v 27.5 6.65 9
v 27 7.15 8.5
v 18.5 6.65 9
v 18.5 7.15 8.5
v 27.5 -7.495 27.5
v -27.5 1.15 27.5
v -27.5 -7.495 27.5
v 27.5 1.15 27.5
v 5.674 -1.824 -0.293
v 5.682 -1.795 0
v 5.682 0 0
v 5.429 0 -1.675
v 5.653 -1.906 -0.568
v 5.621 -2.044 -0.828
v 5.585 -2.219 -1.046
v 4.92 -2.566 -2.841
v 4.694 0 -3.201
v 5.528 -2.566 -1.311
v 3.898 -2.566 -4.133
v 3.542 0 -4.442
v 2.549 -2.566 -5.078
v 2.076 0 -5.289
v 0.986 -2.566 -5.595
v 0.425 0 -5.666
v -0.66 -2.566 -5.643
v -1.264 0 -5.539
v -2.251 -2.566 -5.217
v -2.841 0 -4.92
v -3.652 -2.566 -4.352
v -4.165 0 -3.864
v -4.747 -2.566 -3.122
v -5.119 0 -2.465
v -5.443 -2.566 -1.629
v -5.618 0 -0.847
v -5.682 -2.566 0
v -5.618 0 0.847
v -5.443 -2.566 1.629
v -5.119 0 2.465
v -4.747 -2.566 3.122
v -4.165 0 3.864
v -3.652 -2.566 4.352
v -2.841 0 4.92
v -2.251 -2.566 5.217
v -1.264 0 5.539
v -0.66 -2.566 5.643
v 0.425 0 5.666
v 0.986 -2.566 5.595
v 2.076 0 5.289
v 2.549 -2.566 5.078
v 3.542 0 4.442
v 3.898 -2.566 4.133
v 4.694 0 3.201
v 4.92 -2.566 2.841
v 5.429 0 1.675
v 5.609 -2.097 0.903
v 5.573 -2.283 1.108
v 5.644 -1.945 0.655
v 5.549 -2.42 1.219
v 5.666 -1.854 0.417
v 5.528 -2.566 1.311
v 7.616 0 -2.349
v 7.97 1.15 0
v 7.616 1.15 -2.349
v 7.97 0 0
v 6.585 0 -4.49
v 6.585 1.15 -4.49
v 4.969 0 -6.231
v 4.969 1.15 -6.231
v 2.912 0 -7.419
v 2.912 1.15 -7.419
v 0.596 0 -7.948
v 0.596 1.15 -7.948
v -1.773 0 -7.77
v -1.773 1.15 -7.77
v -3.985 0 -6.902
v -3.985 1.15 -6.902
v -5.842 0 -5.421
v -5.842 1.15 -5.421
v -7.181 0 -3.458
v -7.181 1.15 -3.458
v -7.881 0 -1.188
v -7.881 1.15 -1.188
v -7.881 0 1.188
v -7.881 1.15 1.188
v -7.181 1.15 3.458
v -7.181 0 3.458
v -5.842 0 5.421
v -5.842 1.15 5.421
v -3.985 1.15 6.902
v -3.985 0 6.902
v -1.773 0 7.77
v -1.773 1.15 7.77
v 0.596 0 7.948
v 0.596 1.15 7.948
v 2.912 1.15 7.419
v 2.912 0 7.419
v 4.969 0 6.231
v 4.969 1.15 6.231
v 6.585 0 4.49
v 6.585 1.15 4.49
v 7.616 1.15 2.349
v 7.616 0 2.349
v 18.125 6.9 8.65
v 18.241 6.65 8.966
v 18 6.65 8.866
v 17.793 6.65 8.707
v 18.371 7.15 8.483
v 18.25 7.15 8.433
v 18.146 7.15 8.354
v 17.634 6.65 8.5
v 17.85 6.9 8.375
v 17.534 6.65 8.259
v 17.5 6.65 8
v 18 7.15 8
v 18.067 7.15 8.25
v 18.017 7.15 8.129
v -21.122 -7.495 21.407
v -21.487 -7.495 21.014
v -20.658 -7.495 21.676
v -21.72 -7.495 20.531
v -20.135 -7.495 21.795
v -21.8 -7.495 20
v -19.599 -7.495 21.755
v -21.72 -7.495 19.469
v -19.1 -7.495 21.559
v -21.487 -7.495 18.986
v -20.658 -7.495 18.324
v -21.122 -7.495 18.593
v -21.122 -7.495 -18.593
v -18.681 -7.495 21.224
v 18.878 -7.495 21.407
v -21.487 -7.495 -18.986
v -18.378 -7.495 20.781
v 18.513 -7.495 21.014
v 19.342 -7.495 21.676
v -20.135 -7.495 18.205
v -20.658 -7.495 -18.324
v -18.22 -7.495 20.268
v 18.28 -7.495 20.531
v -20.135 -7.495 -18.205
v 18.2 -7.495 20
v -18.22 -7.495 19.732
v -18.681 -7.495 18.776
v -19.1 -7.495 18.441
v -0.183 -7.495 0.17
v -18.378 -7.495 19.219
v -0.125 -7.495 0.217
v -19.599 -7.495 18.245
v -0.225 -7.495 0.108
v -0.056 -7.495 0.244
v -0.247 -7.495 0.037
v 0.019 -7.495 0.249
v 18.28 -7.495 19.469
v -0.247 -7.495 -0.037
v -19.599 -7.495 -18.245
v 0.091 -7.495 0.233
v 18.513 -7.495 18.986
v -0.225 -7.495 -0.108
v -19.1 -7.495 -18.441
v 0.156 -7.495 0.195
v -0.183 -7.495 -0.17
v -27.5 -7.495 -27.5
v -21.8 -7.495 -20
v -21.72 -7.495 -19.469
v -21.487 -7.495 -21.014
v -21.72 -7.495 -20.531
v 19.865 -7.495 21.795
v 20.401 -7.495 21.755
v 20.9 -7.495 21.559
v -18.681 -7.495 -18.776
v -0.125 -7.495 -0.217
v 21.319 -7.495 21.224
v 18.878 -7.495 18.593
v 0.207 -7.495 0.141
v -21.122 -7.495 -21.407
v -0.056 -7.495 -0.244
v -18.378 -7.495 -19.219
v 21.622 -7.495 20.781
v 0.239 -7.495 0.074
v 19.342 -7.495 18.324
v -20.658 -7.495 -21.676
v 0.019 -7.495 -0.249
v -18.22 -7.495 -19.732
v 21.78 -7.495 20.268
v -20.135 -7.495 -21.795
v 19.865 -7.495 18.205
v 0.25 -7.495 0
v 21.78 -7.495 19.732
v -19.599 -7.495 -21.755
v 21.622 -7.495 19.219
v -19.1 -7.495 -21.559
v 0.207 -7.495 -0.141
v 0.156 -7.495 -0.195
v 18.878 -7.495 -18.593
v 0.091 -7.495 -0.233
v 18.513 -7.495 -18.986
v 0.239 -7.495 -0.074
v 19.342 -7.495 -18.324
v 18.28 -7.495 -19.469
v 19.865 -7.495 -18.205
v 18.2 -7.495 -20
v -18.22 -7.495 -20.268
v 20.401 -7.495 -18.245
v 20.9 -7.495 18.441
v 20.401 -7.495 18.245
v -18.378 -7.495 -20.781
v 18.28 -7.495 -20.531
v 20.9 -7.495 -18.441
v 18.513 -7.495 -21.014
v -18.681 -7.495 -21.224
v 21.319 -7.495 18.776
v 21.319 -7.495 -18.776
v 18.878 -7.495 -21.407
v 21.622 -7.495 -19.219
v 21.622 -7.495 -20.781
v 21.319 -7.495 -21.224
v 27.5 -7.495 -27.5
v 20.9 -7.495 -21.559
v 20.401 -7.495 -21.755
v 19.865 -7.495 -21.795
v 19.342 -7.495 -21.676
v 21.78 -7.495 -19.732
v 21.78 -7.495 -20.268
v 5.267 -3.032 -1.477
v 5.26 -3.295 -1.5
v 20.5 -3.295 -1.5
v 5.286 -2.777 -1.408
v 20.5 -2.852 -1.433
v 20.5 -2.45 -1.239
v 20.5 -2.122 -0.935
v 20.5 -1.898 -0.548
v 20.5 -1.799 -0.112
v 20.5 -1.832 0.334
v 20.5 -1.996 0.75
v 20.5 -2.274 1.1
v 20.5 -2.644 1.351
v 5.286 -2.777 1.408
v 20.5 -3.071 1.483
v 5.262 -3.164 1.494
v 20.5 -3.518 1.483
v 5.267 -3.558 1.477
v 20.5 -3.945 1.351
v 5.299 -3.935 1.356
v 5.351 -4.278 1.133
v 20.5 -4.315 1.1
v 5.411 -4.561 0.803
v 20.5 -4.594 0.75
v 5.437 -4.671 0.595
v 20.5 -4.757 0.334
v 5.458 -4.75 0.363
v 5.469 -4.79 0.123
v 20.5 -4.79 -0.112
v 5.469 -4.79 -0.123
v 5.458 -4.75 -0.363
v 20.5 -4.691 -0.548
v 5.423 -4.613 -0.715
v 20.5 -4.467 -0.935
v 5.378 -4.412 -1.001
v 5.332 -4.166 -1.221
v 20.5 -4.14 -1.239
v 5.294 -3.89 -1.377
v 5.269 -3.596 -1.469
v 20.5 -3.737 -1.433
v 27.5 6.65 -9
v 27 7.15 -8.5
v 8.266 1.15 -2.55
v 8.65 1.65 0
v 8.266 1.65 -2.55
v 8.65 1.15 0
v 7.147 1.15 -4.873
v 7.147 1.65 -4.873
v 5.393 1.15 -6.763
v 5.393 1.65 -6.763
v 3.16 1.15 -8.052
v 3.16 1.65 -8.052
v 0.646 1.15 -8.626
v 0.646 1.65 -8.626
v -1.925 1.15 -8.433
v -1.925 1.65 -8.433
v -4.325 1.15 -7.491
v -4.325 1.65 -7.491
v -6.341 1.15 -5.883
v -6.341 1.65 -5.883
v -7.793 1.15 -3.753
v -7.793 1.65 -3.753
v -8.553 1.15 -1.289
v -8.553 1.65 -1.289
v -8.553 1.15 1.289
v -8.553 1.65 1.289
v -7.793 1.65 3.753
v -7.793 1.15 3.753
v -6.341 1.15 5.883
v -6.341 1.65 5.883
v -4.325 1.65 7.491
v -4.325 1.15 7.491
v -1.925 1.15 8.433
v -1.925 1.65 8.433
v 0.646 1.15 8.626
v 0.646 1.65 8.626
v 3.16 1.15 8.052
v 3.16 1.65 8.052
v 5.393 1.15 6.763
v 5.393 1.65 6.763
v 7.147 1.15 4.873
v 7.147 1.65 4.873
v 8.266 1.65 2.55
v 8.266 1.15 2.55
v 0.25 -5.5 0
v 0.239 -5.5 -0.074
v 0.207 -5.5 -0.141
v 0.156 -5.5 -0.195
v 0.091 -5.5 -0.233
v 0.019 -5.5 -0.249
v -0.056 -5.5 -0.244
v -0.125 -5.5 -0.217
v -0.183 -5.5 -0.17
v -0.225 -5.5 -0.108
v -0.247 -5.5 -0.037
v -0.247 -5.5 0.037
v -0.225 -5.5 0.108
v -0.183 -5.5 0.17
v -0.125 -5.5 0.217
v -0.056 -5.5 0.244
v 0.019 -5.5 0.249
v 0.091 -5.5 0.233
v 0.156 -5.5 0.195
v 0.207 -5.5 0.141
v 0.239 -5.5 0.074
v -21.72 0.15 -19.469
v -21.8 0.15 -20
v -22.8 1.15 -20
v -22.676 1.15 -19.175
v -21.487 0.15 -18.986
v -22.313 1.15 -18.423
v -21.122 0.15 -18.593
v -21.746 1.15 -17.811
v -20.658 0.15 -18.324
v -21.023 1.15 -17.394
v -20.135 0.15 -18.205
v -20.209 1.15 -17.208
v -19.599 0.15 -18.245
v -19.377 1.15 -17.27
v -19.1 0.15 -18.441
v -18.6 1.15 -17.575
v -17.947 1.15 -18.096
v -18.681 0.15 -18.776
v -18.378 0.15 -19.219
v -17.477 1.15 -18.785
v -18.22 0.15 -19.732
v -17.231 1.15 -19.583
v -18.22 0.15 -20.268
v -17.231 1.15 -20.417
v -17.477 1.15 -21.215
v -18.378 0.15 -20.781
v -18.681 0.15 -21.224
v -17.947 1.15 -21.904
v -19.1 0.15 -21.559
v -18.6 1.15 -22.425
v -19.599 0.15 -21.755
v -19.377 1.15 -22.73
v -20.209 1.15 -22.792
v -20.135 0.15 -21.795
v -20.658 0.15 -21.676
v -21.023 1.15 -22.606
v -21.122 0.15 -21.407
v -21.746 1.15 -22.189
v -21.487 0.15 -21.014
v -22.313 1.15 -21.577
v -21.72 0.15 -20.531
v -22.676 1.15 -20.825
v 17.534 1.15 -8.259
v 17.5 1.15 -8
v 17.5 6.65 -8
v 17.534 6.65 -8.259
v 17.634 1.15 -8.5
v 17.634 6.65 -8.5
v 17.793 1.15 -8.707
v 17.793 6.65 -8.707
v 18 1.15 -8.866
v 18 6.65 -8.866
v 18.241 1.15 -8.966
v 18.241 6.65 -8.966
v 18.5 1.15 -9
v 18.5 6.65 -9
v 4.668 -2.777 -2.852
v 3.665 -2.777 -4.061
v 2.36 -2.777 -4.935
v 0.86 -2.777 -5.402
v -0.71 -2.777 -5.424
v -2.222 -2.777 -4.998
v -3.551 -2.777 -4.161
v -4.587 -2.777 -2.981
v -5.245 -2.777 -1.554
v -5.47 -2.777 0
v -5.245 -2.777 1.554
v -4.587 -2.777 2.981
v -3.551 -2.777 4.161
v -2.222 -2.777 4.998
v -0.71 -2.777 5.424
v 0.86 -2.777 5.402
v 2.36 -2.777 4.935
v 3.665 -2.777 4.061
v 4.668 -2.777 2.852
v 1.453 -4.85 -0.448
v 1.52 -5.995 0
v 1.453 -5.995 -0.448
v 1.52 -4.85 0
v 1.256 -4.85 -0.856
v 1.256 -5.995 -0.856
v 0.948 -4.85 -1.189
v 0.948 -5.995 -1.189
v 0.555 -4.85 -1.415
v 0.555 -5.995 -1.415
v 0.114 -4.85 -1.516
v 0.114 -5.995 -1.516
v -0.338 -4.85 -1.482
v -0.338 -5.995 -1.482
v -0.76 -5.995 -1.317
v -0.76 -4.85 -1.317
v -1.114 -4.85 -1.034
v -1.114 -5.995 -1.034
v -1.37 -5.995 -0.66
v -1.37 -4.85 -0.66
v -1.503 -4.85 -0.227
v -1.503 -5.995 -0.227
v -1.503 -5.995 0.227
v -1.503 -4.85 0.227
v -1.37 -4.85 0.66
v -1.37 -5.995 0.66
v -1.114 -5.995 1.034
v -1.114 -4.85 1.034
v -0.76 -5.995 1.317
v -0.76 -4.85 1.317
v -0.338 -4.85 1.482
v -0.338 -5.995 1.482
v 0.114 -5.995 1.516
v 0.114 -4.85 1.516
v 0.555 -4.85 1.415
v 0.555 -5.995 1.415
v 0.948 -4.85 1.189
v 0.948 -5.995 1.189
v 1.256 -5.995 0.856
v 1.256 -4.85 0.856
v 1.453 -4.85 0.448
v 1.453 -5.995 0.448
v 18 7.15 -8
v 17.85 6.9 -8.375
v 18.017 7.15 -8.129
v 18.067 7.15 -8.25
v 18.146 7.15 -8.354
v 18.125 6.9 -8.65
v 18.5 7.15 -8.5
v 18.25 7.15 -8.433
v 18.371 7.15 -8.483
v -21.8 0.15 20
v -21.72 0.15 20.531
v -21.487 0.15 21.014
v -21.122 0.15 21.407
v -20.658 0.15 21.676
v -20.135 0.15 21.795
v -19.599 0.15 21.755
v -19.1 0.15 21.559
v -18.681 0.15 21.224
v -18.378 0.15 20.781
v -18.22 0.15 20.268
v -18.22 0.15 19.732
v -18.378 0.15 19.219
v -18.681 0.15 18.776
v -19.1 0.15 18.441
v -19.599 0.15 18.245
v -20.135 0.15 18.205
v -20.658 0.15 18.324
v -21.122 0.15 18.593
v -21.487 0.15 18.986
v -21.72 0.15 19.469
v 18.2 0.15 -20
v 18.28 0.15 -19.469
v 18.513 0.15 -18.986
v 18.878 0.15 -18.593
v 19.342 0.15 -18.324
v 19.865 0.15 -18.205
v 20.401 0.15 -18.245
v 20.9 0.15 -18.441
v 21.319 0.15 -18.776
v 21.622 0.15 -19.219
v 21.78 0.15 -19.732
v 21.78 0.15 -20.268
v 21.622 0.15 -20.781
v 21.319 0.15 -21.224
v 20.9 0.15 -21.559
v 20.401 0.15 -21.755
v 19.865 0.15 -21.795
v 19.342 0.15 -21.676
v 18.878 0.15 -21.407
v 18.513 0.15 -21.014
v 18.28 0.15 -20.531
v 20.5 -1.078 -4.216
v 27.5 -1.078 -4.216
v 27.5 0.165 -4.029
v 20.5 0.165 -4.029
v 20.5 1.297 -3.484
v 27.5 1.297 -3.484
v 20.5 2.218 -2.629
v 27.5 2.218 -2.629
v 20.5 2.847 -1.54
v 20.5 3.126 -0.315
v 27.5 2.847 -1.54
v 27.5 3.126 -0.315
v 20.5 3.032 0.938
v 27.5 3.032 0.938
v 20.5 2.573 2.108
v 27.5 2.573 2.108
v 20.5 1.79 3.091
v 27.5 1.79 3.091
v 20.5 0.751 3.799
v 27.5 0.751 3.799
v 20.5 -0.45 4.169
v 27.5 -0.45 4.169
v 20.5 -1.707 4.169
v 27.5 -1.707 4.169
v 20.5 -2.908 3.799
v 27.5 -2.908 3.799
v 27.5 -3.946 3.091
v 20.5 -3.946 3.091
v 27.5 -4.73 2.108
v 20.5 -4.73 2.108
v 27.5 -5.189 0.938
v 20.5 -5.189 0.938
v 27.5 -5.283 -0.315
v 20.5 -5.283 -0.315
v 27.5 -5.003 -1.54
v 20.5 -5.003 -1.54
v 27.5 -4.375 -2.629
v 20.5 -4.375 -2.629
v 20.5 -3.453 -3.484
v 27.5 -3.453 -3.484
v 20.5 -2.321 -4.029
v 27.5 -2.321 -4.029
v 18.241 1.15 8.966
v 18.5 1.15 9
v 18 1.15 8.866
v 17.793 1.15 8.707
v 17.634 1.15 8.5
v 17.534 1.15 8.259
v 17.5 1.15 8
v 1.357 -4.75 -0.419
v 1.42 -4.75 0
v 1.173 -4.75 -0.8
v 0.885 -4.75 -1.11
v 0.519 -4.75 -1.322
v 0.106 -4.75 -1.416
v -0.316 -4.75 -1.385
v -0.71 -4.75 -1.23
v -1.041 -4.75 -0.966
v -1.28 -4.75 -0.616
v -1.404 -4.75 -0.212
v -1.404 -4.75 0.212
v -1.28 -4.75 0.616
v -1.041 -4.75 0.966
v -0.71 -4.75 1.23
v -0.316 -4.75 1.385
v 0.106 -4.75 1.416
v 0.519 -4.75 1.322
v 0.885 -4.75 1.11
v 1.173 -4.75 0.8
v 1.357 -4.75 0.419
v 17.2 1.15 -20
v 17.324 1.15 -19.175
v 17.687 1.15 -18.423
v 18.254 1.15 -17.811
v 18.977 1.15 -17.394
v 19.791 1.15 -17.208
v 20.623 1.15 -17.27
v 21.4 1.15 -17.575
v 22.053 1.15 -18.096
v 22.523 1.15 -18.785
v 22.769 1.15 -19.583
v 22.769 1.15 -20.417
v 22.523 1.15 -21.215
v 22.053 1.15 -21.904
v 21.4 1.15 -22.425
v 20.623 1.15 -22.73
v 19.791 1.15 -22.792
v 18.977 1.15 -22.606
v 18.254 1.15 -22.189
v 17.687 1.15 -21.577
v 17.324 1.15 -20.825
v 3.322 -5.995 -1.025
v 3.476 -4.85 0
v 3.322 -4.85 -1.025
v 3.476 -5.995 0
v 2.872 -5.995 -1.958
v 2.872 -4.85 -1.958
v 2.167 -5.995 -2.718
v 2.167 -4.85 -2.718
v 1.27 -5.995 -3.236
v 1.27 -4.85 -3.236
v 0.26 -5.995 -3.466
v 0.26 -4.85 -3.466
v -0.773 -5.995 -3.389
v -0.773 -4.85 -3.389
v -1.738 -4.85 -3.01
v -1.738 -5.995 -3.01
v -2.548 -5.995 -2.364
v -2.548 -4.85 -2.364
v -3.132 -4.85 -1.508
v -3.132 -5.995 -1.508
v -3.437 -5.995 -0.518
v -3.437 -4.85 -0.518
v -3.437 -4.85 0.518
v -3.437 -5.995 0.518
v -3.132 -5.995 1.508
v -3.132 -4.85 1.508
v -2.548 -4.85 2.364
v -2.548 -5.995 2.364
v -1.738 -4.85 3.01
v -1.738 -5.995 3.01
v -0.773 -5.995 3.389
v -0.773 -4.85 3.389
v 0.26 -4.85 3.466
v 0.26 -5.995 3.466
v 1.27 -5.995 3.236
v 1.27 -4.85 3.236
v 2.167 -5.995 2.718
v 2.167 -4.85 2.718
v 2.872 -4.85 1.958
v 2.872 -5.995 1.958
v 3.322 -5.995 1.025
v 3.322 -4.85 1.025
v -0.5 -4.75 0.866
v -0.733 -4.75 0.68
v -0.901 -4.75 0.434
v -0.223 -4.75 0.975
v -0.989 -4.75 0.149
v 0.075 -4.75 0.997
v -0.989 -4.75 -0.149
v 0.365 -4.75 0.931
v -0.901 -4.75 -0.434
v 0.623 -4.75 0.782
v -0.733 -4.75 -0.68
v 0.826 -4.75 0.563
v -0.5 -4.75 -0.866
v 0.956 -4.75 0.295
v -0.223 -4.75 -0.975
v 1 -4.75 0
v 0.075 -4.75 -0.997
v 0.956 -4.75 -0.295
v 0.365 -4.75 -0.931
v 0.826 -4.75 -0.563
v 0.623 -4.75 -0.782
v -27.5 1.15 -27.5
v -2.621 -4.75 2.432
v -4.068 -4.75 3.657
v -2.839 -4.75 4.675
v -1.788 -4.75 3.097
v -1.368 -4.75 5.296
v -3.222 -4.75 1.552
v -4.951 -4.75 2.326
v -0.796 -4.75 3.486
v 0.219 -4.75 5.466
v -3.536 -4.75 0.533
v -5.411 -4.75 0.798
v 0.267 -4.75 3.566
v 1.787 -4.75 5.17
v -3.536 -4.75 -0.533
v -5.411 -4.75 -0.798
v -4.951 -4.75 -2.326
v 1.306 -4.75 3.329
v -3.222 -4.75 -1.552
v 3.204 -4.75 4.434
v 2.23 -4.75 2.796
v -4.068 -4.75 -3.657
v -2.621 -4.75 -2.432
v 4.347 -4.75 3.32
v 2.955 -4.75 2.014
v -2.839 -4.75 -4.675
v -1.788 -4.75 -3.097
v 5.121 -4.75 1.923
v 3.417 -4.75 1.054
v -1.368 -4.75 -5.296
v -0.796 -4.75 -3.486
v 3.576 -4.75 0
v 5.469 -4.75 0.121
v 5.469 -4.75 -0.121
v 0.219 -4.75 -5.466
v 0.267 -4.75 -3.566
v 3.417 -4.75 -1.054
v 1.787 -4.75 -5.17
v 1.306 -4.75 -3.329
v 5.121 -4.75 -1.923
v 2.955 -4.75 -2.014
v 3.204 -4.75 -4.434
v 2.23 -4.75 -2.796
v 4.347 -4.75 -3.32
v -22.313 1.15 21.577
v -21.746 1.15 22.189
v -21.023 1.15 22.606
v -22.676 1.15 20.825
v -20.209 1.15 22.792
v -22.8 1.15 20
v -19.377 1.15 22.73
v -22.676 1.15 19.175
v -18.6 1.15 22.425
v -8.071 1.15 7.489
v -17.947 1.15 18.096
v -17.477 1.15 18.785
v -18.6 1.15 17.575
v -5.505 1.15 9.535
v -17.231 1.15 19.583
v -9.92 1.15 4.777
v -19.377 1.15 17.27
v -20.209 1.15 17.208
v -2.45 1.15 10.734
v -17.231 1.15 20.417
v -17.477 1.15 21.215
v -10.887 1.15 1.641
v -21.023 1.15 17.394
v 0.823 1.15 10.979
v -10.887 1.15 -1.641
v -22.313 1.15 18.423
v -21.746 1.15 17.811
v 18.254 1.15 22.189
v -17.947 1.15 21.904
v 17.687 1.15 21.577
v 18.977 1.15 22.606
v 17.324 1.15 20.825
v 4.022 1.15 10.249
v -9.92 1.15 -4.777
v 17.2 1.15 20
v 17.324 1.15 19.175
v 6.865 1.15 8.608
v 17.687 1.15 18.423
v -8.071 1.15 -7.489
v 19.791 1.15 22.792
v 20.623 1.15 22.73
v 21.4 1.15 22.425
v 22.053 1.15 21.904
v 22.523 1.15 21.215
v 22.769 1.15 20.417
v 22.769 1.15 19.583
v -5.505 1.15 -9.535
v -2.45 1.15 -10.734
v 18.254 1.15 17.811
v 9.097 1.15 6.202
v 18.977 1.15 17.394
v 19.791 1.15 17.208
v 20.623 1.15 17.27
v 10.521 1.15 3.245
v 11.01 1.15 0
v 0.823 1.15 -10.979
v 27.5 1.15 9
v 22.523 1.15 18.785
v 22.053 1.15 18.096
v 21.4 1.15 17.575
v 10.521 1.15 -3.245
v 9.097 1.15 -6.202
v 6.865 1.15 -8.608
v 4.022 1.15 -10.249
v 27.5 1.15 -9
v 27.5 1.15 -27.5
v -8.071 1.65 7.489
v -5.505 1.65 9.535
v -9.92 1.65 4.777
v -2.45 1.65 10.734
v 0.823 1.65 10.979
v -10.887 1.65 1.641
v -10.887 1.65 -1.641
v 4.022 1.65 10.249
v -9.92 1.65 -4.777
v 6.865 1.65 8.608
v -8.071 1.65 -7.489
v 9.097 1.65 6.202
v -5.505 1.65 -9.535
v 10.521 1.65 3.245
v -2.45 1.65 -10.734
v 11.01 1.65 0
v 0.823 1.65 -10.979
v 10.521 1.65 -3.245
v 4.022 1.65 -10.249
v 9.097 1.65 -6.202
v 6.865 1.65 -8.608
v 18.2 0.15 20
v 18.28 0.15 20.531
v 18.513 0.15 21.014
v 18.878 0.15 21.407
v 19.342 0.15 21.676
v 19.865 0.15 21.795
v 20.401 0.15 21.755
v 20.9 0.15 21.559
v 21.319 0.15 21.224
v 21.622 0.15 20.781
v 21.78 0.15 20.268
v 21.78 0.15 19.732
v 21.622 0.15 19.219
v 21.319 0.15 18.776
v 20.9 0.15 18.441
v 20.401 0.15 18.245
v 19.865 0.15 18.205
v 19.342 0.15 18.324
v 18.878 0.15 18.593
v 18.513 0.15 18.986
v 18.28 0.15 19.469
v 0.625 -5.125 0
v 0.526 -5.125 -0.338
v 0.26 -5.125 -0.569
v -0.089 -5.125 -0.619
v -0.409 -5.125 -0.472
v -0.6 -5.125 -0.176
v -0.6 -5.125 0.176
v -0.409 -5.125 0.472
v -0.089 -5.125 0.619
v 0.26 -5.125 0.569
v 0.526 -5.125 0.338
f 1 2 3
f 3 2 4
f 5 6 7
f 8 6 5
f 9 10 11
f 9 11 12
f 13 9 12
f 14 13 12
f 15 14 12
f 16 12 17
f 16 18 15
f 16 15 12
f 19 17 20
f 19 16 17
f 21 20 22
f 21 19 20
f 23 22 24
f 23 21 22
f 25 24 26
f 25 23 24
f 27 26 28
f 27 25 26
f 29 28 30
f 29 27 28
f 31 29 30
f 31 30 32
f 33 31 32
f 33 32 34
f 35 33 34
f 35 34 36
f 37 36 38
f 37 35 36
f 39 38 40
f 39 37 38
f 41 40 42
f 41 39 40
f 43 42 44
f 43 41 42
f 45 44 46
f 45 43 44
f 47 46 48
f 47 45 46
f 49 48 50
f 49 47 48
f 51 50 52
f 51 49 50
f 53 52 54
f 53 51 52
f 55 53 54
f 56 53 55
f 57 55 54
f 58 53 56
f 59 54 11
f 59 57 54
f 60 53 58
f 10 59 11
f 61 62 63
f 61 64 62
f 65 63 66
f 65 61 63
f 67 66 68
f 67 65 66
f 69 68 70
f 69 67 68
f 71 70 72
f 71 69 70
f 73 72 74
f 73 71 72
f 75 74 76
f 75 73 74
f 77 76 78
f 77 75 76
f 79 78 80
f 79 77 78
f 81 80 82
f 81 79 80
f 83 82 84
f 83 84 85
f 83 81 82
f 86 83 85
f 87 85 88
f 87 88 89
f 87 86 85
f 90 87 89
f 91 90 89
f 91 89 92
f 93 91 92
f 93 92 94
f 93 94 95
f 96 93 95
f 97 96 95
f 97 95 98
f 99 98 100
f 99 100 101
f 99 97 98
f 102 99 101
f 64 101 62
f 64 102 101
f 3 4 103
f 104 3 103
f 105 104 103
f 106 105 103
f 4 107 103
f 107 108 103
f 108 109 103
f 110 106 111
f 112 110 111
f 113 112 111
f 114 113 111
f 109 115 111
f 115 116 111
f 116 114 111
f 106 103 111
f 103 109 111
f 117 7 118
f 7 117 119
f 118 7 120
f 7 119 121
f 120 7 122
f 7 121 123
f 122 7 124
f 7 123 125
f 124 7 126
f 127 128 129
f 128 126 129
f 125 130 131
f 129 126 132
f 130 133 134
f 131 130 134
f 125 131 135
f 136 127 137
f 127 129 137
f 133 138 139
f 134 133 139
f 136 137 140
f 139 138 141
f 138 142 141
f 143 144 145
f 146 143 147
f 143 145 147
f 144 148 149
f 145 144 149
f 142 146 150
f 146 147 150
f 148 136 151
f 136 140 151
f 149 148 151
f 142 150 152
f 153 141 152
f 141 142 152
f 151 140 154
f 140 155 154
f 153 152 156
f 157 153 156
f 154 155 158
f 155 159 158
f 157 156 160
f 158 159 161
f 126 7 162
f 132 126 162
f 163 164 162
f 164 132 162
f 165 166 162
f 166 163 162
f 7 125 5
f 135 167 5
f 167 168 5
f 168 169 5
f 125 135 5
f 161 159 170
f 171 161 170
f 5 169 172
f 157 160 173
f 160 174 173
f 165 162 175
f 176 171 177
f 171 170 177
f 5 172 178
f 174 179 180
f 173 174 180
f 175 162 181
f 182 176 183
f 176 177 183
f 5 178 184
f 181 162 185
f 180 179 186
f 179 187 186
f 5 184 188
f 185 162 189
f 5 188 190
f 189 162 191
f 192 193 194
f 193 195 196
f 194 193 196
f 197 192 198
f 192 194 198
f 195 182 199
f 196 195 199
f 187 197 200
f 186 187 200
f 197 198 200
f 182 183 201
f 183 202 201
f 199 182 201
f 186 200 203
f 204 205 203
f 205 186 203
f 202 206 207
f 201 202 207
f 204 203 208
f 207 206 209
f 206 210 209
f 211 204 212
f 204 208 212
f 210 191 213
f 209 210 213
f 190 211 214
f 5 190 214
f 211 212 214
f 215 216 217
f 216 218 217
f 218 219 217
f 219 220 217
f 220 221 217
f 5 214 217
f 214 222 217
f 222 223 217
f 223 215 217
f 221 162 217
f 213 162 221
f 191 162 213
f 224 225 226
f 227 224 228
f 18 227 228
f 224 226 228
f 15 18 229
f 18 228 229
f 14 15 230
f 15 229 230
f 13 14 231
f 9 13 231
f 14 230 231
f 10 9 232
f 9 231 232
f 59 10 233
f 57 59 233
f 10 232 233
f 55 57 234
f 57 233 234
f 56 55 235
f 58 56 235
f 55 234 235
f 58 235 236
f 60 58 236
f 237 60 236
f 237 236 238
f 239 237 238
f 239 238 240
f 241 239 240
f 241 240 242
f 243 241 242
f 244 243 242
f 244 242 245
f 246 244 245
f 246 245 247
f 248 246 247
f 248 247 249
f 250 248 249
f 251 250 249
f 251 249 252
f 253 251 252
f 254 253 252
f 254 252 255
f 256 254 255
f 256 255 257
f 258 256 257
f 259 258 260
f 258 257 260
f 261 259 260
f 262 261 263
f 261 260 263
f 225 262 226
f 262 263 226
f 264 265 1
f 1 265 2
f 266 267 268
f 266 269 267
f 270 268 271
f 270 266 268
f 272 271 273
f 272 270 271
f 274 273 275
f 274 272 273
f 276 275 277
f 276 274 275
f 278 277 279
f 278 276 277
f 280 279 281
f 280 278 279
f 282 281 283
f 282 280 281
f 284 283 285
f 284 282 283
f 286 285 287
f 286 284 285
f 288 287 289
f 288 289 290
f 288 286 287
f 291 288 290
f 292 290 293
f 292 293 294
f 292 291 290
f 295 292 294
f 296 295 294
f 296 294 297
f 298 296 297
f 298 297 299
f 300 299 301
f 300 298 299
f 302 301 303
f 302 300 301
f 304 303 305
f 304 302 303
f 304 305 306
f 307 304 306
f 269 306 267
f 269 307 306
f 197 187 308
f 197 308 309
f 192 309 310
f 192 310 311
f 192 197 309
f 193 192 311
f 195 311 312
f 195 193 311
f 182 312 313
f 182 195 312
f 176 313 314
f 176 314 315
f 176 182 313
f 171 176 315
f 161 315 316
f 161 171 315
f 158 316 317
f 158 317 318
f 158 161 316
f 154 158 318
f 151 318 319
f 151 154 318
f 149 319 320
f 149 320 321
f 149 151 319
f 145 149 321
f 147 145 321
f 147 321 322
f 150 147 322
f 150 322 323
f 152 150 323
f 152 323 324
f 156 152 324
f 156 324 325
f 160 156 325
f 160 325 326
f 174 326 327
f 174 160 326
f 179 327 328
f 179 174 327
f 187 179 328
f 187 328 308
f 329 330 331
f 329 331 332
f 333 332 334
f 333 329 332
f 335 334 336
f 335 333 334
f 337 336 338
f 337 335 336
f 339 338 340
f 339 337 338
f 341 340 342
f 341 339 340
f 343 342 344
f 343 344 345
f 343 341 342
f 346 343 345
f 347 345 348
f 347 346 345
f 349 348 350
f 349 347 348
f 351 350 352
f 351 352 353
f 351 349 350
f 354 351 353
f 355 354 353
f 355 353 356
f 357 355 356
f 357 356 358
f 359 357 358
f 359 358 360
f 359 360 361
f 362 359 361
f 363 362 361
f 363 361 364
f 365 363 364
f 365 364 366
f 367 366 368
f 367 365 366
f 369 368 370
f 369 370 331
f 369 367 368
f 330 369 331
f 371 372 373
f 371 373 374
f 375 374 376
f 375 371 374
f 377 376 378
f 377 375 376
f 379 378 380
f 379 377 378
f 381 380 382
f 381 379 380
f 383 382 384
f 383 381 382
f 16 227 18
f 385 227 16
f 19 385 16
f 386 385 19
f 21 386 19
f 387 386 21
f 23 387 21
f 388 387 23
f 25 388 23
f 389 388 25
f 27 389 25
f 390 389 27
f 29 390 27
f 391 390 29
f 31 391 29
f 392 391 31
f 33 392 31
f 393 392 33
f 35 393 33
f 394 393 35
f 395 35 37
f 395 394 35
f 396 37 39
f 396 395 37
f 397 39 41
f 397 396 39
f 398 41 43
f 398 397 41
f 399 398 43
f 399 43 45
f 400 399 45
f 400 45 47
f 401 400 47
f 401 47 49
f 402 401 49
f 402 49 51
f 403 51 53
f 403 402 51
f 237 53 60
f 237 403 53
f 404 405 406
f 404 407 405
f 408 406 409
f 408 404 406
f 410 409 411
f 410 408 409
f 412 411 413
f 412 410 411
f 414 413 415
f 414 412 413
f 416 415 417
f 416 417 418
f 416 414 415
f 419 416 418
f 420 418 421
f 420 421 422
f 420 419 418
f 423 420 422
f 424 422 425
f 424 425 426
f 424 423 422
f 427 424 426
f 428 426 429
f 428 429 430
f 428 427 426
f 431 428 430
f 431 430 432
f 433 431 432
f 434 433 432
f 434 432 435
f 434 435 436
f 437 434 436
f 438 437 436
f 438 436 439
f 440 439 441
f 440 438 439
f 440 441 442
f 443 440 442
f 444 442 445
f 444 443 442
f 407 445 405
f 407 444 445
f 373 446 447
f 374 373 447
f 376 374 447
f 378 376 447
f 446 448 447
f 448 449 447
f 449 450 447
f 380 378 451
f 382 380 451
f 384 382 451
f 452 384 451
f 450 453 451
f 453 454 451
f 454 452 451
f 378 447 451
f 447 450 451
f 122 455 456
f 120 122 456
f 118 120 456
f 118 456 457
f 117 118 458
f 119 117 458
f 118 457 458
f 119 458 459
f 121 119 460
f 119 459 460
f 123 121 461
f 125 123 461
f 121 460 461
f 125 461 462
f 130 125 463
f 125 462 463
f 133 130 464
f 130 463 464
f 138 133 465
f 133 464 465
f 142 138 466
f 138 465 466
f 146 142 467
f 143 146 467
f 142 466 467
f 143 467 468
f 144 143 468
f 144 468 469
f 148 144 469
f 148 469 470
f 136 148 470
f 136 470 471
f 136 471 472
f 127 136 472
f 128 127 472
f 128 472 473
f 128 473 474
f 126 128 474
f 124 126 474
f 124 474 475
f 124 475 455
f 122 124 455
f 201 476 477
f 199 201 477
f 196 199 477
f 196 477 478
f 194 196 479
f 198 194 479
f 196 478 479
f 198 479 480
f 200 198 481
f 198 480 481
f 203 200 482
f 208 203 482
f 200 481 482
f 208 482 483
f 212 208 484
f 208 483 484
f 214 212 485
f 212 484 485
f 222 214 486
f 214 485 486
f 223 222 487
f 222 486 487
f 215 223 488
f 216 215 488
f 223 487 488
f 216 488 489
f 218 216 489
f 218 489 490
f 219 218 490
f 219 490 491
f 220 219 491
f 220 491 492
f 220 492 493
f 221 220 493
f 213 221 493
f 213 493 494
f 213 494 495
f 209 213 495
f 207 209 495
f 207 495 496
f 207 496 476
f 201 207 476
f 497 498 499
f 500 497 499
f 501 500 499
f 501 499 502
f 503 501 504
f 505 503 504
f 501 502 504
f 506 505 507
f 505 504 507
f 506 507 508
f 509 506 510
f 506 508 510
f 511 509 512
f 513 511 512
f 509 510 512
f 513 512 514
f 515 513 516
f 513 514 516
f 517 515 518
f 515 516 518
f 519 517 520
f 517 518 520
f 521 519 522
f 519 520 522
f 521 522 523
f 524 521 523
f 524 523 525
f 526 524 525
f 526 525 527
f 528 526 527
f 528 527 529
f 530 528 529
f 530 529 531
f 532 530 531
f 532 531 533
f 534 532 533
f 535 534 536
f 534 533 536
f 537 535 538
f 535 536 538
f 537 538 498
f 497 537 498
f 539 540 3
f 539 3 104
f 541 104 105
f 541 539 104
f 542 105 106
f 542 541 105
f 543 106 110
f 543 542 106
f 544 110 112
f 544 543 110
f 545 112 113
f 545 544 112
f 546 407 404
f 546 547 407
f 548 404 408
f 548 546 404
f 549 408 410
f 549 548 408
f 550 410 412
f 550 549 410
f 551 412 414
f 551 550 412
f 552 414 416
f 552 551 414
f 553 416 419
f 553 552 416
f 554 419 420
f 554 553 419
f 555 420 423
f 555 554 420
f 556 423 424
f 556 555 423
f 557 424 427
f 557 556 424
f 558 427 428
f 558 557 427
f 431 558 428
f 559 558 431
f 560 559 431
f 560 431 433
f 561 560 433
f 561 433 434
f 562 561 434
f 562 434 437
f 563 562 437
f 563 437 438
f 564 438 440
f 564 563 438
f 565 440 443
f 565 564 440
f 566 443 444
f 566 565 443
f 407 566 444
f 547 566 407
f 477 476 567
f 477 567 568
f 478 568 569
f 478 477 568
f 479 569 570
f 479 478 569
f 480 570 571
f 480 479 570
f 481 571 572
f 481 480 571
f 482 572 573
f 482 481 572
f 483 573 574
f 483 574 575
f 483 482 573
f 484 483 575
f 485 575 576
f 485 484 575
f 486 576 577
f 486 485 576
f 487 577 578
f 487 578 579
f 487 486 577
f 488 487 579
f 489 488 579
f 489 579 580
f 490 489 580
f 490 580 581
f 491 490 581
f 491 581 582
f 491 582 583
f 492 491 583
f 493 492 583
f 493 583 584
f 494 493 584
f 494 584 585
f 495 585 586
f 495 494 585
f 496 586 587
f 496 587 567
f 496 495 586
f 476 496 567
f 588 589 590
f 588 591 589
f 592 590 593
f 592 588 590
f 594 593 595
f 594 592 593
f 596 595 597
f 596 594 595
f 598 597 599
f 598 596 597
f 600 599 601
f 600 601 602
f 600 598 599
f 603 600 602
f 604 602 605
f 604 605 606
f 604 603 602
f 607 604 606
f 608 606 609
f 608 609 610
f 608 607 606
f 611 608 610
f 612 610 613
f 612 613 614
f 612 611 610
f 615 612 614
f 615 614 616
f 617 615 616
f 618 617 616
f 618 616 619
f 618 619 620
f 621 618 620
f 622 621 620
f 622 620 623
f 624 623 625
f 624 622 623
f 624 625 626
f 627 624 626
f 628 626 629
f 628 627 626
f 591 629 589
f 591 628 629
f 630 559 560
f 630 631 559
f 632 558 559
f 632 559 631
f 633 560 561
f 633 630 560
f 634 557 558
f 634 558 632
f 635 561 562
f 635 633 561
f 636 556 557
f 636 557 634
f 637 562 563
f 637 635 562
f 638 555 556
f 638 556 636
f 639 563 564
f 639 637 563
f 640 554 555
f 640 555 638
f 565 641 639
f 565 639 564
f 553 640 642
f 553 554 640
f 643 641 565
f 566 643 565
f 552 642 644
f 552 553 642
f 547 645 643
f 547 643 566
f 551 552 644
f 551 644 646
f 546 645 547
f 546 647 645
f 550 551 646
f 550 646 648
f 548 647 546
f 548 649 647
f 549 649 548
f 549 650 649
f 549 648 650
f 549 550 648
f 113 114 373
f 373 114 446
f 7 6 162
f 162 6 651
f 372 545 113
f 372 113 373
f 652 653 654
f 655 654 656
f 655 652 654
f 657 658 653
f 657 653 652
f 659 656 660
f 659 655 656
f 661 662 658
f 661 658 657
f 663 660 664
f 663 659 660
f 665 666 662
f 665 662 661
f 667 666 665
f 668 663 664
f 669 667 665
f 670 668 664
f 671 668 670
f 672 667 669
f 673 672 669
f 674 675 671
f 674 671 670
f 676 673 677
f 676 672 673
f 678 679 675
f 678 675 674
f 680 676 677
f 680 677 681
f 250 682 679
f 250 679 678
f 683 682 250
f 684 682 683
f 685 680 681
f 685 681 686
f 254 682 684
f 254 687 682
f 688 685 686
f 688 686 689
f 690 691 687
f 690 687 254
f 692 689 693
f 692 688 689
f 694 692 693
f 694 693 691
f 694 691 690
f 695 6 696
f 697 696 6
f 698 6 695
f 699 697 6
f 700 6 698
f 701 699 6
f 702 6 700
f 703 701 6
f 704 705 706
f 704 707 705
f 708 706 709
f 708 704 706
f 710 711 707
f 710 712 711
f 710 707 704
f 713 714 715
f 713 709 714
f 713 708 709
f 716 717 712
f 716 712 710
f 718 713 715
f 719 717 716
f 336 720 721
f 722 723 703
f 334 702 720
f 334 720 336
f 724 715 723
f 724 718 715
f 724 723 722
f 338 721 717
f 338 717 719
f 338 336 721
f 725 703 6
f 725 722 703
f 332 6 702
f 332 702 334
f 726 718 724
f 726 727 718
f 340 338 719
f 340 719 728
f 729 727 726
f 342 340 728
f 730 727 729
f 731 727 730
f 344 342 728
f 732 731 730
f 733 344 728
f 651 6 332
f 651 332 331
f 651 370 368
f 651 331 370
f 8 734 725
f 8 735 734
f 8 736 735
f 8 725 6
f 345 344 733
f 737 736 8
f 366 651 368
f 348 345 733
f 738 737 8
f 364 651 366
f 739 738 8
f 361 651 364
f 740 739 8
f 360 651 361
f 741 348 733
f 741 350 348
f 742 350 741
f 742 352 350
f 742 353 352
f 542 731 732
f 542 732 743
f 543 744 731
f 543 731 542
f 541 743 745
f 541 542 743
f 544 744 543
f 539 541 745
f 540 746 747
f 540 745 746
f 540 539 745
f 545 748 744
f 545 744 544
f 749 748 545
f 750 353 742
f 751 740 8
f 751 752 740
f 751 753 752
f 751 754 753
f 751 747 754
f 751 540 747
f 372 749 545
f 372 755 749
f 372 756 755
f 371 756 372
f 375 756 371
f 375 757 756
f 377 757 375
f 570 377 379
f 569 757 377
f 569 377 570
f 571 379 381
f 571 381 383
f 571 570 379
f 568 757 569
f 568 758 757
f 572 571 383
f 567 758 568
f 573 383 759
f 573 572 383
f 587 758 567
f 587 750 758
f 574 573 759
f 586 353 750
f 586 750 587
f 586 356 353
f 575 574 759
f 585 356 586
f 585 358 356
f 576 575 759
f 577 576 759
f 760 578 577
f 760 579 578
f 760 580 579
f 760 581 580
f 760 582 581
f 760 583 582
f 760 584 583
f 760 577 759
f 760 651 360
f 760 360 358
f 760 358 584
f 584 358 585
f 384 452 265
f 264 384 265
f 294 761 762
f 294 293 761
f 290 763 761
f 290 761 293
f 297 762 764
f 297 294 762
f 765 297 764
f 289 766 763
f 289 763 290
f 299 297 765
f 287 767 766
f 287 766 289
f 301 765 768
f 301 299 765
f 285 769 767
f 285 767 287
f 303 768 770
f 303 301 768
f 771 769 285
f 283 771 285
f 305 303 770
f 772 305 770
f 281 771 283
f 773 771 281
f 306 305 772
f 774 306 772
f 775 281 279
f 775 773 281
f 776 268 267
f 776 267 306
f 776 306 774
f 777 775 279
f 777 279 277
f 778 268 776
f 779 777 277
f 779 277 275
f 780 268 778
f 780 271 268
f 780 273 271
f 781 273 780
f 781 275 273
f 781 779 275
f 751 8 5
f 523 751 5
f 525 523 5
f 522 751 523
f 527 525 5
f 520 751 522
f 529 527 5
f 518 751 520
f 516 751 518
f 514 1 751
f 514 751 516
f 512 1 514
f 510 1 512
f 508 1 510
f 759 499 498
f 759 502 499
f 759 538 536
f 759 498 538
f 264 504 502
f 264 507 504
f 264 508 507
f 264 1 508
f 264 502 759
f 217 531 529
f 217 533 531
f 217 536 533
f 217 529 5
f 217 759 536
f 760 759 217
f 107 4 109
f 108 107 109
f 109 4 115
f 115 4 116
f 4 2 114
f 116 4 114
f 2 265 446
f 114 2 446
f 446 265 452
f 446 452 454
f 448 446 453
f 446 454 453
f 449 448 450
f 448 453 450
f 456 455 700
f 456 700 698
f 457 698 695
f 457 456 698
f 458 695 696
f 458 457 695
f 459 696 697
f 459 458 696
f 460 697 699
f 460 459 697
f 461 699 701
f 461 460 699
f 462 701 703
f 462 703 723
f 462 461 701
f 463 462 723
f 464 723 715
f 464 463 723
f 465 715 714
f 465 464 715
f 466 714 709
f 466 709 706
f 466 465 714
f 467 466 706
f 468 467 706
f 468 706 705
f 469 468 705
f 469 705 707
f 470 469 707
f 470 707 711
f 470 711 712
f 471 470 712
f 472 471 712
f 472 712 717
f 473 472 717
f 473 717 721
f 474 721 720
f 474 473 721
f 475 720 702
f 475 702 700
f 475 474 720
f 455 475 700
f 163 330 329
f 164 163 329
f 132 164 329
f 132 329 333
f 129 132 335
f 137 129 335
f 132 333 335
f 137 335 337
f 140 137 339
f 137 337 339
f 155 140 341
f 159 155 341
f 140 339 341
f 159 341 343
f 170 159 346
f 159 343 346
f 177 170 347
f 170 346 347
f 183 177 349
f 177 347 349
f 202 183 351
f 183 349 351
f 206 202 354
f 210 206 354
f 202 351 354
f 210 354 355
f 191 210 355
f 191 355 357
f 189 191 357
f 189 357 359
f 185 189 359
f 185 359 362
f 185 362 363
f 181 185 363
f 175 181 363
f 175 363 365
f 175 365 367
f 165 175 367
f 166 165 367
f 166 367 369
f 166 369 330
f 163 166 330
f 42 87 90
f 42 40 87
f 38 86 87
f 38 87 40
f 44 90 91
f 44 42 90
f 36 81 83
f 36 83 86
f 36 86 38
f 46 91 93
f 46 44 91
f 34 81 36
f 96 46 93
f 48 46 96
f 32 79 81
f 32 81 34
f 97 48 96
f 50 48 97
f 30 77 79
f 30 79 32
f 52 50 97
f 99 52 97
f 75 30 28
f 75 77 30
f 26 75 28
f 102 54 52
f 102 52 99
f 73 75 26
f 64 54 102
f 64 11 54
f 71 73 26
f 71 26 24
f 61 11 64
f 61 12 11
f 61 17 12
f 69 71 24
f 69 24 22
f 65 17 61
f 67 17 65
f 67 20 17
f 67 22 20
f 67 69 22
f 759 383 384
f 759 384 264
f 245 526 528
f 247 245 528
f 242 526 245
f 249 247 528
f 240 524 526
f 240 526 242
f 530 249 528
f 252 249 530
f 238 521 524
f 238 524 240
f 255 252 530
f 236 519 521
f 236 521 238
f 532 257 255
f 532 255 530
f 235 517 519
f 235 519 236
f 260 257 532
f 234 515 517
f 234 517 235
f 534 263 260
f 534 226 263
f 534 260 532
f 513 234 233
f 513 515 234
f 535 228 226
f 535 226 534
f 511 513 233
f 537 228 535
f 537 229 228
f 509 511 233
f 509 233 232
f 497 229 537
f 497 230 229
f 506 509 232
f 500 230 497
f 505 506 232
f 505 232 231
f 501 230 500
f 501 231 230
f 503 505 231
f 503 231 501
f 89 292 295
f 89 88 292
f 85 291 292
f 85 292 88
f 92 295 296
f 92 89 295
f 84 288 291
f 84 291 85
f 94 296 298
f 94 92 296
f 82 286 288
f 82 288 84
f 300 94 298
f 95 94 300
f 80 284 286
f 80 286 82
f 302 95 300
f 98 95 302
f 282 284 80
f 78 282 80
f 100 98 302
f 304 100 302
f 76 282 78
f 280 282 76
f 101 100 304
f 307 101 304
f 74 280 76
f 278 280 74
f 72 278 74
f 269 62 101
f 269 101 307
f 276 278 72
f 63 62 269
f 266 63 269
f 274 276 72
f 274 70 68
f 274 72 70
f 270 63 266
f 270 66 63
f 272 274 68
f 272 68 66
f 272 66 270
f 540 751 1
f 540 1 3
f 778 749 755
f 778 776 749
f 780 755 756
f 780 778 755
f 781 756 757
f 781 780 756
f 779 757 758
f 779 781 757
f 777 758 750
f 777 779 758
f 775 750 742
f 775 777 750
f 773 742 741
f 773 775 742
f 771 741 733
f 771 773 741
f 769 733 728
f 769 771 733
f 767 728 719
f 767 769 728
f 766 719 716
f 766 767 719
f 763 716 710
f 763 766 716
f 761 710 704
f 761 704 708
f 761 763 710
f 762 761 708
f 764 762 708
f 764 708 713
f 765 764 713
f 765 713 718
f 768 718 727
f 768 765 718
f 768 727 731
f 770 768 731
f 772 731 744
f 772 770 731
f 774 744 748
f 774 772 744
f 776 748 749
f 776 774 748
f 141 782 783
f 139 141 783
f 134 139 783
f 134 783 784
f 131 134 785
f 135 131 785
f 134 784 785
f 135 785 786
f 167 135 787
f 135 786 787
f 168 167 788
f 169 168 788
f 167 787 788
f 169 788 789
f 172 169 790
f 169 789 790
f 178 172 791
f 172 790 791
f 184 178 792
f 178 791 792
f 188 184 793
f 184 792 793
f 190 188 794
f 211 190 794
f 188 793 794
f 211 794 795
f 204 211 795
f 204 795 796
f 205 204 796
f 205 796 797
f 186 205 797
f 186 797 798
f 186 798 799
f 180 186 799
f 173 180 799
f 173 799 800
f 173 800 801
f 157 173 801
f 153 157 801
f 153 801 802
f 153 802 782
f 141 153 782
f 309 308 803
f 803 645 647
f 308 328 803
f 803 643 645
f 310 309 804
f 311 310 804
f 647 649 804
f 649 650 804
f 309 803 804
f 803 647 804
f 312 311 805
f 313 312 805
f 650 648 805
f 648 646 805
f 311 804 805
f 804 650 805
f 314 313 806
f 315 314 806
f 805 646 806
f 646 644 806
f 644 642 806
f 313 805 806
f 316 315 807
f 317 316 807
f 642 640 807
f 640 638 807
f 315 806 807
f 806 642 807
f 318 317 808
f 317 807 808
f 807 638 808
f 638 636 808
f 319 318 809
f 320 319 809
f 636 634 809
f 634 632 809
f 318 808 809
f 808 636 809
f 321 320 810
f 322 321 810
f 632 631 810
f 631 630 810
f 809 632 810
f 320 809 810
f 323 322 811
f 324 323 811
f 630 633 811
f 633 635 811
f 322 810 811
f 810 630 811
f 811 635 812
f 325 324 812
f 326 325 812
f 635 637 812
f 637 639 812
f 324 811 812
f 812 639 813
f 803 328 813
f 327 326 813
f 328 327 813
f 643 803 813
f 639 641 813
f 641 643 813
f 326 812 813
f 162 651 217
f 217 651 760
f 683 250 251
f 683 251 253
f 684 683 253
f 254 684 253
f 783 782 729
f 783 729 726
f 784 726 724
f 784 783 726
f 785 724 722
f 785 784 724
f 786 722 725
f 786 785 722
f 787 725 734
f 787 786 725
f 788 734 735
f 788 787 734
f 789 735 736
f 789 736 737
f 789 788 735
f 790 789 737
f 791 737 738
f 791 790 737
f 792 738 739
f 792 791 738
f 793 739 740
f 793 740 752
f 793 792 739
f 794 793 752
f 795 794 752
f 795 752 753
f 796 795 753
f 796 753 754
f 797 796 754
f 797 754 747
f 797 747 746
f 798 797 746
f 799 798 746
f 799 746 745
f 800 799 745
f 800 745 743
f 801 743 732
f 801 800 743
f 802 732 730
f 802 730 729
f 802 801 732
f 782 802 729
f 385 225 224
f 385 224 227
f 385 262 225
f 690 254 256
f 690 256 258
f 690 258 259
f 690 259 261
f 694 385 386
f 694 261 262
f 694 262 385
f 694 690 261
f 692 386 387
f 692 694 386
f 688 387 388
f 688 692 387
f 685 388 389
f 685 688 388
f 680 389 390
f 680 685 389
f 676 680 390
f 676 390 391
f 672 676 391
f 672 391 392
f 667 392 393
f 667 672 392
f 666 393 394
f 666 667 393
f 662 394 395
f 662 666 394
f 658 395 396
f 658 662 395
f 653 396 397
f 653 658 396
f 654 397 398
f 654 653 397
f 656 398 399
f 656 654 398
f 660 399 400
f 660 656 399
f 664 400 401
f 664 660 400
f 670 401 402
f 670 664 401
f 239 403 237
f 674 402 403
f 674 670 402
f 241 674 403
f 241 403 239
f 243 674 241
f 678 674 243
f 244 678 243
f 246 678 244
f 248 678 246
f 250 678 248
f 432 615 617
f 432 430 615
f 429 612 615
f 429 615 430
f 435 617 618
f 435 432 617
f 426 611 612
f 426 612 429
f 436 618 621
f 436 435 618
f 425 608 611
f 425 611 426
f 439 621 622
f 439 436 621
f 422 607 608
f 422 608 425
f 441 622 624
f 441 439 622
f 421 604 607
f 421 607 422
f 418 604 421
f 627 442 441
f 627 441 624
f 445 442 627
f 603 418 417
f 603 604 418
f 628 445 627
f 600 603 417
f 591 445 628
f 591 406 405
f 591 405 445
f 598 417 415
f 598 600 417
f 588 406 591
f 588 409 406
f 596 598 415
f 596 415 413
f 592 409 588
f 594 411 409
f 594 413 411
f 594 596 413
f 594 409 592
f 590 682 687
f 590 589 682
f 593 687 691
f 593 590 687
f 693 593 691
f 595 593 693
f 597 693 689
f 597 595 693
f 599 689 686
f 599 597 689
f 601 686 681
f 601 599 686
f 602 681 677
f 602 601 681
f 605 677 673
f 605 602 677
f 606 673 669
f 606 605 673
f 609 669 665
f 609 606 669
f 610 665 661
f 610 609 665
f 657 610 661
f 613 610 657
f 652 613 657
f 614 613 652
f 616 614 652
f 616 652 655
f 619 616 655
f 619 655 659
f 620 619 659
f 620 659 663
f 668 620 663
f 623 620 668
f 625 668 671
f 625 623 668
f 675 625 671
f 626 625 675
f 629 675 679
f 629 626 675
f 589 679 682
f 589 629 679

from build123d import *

# Parameters (mm, degrees)
SKETCH2_W               = 55
SKETCH2_H               = 55
SKETCH2_R               = 20
BOSS_EXTRUDE1_DEPTH     = 8.6446
CUT_EXTRUDE1_REACH      = 63.947
CUT_EXTRUDE1_END_RADIUS = 5.47
SKETCH3_R               = 1.5
CUT_EXTRUDE2_REACH      = 41.84
SKETCH4_R               = 1.8
CHAMFER1_SIZE           = 1
BOSS_EXTRUDE2_DEPTH     = 6
SKETCH8_R               = 4.2164
CUT_EXTRUDE5_DEPTH      = 7
CHAMFER2_SIZE           = 0.5
CHAMFER3_SIZE           = 0.75


# Read off the part's stored shape, not the designer's step: Revolve2
with BuildPart() as part:
    # Revolve2 outline → Revolve2 (revolve)
    with BuildSketch(Plane.XY):
        Polygon((20, -7.4946), (20, 1.15), (11.01, 1.15), (11.01, 1.65), (8.65, 1.65), (8.65, 1.15), (7.97, 1.15), (7.97, 0), (5.681592205, 0), (5.681592205, -2.5658216), (5.47, -2.777413805), (5.47, -4.75), (3.57599, -4.75), (3.47599, -4.85), (3.47599, -5.9946), (1.52019, -5.9946), (1.52019, -4.85), (1.42019, -4.75), (0.25, -4.75), (0.25, -7.4946), align=None)
    revolve(axis=Axis((0, 0, 0), (0, 1, 0)))

    # Sketch2 → Boss-Extrude1 (add)
    with BuildSketch(Plane(origin=(0, 1.15, 0), x_dir=(1, 0, 0), z_dir=(0, 1, 0))):
        Rectangle(SKETCH2_W, SKETCH2_H)
        Circle(SKETCH2_R, mode=Mode.SUBTRACT)
    extrude(amount=-BOSS_EXTRUDE1_DEPTH)

    # Cut-Extrude1: up to this cylinder (the profile starts outside it)
    cut_extrude1_end = Plane(origin=(0, -3.2946, 0), z_dir=(0, 1, 0)) * Cylinder(CUT_EXTRUDE1_END_RADIUS, 139.834, mode=Mode.PRIVATE)
    # Sketch3 → Cut-Extrude1 (cut, up to the surface)
    with BuildSketch(Plane(origin=(27.5, 0, 0), x_dir=(0, 0, -1), z_dir=(1, 0, 0)), mode=Mode.PRIVATE) as cut_extrude1_sk1:
        with Locations((0, -3.2946)):
            Circle(SKETCH3_R)
    cut_extrude1_tool1 = extrude(cut_extrude1_sk1.sketch, amount=-CUT_EXTRUDE1_REACH, mode=Mode.PRIVATE) - cut_extrude1_end
    add(cut_extrude1_tool1.solids().sort_by_distance((27.5, -3.2946, 0))[0], mode=Mode.SUBTRACT)

    # Sketch4 → Cut-Extrude2 (cut, up to next)
    with BuildSketch(Plane(origin=(0, 1.15, 0), x_dir=(1, 0, 0), z_dir=(0, 1, 0)), mode=Mode.PRIVATE) as cut_extrude2_sk1:
        with Locations(Location((20, 20, 0), (0, 0, 180))):
            Circle(SKETCH4_R)
    cut_extrude2_tool1 = extrude(cut_extrude2_sk1.sketch, amount=-CUT_EXTRUDE2_REACH, mode=Mode.PRIVATE) & part.part
    # Sketch4 → Cut-Extrude2 (cut, up to next)
    with BuildSketch(Plane(origin=(0, 1.15, 0), x_dir=(1, 0, 0), z_dir=(0, 1, 0)), mode=Mode.PRIVATE) as cut_extrude2_sk2:
        with Locations(Location((20, -20, 0), (0, 0, 180))):
            Circle(SKETCH4_R)
    cut_extrude2_tool2 = extrude(cut_extrude2_sk2.sketch, amount=-CUT_EXTRUDE2_REACH, mode=Mode.PRIVATE) & part.part
    # Sketch4 → Cut-Extrude2 (cut, up to next)
    with BuildSketch(Plane(origin=(0, 1.15, 0), x_dir=(1, 0, 0), z_dir=(0, 1, 0)), mode=Mode.PRIVATE) as cut_extrude2_sk3:
        with Locations(Location((-20, -20, 0), (0, 0, 180))):
            Circle(SKETCH4_R)
    cut_extrude2_tool3 = extrude(cut_extrude2_sk3.sketch, amount=-CUT_EXTRUDE2_REACH, mode=Mode.PRIVATE) & part.part
    # Sketch4 → Cut-Extrude2 (cut, up to next)
    with BuildSketch(Plane(origin=(0, 1.15, 0), x_dir=(1, 0, 0), z_dir=(0, 1, 0)), mode=Mode.PRIVATE) as cut_extrude2_sk4:
        with Locations(Location((-20, 20, 0), (0, 0, 180))):
            Circle(SKETCH4_R)
    cut_extrude2_tool4 = extrude(cut_extrude2_sk4.sketch, amount=-CUT_EXTRUDE2_REACH, mode=Mode.PRIVATE) & part.part
    add(cut_extrude2_tool1.solids().sort_by_distance((20, 1.15, -20))[0], mode=Mode.SUBTRACT)
    add(cut_extrude2_tool2.solids().sort_by_distance((20, 1.15, 20))[0], mode=Mode.SUBTRACT)
    add(cut_extrude2_tool3.solids().sort_by_distance((-20, 1.15, 20))[0], mode=Mode.SUBTRACT)
    add(cut_extrude2_tool4.solids().sort_by_distance((-20, 1.15, -20))[0], mode=Mode.SUBTRACT)

    # Chamfer1
    chamfer1_edges = [part.edges().sort_by_distance(p)[0] for p in [
        (-18.2, 1.15, -20),
        (-18.2, 1.15, 20),
        (21.8, 1.15, 20),
        (21.8, 1.15, -20),
    ]]
    chamfer(chamfer1_edges, length=CHAMFER1_SIZE)

    # Sketch9 → Boss-Extrude2 (add)
    with BuildSketch(Plane(origin=(0, 1.15, 0), x_dir=(1, 0, 0), z_dir=(0, 1, 0))):
        with BuildLine():
            Line((18.5, 9), (27.5, 9))
            Line((27.5, 9), (27.5, -9))
            Line((27.5, -9), (18.5, -9))
            ThreePointArc((18.5, -9), (17.792893219, -8.707106781), (17.5, -8))
            Line((17.5, -8), (17.5, 8))
            ThreePointArc((17.5, 8), (17.792893219, 8.707106781), (18.5, 9))
        make_face()
    extrude(amount=BOSS_EXTRUDE2_DEPTH)

    # Sketch8 → Cut-Extrude5 (cut)
    with BuildSketch(Plane(origin=(27.5, 0, 0), x_dir=(0, 0, -1), z_dir=(1, 0, 0))):
        with Locations((0, -1.0782)):
            Circle(SKETCH8_R)
    extrude(amount=-CUT_EXTRUDE5_DEPTH, mode=Mode.SUBTRACT)

    # Chamfer2
    chamfer2_edges = [part.edges().sort_by_distance(p)[0] for p in [
        (27.5, 7.15, 0),
        (23, 7.15, -9),
        (17.792893219, 7.15, -8.707106781),
        (17.5, 7.15, 0),
        (17.792893219, 7.15, 8.707106781),
        (23, 7.15, 9),
    ]]
    chamfer(chamfer2_edges, length=CHAMFER2_SIZE)

    # Chamfer3
    chamfer3_edges = [part.edges().sort_by_distance(p)[0] for p in [
        (-0.25, -4.75, 0),
    ]]
    chamfer(chamfer3_edges, length=CHAMFER3_SIZE)


solid = part.part
